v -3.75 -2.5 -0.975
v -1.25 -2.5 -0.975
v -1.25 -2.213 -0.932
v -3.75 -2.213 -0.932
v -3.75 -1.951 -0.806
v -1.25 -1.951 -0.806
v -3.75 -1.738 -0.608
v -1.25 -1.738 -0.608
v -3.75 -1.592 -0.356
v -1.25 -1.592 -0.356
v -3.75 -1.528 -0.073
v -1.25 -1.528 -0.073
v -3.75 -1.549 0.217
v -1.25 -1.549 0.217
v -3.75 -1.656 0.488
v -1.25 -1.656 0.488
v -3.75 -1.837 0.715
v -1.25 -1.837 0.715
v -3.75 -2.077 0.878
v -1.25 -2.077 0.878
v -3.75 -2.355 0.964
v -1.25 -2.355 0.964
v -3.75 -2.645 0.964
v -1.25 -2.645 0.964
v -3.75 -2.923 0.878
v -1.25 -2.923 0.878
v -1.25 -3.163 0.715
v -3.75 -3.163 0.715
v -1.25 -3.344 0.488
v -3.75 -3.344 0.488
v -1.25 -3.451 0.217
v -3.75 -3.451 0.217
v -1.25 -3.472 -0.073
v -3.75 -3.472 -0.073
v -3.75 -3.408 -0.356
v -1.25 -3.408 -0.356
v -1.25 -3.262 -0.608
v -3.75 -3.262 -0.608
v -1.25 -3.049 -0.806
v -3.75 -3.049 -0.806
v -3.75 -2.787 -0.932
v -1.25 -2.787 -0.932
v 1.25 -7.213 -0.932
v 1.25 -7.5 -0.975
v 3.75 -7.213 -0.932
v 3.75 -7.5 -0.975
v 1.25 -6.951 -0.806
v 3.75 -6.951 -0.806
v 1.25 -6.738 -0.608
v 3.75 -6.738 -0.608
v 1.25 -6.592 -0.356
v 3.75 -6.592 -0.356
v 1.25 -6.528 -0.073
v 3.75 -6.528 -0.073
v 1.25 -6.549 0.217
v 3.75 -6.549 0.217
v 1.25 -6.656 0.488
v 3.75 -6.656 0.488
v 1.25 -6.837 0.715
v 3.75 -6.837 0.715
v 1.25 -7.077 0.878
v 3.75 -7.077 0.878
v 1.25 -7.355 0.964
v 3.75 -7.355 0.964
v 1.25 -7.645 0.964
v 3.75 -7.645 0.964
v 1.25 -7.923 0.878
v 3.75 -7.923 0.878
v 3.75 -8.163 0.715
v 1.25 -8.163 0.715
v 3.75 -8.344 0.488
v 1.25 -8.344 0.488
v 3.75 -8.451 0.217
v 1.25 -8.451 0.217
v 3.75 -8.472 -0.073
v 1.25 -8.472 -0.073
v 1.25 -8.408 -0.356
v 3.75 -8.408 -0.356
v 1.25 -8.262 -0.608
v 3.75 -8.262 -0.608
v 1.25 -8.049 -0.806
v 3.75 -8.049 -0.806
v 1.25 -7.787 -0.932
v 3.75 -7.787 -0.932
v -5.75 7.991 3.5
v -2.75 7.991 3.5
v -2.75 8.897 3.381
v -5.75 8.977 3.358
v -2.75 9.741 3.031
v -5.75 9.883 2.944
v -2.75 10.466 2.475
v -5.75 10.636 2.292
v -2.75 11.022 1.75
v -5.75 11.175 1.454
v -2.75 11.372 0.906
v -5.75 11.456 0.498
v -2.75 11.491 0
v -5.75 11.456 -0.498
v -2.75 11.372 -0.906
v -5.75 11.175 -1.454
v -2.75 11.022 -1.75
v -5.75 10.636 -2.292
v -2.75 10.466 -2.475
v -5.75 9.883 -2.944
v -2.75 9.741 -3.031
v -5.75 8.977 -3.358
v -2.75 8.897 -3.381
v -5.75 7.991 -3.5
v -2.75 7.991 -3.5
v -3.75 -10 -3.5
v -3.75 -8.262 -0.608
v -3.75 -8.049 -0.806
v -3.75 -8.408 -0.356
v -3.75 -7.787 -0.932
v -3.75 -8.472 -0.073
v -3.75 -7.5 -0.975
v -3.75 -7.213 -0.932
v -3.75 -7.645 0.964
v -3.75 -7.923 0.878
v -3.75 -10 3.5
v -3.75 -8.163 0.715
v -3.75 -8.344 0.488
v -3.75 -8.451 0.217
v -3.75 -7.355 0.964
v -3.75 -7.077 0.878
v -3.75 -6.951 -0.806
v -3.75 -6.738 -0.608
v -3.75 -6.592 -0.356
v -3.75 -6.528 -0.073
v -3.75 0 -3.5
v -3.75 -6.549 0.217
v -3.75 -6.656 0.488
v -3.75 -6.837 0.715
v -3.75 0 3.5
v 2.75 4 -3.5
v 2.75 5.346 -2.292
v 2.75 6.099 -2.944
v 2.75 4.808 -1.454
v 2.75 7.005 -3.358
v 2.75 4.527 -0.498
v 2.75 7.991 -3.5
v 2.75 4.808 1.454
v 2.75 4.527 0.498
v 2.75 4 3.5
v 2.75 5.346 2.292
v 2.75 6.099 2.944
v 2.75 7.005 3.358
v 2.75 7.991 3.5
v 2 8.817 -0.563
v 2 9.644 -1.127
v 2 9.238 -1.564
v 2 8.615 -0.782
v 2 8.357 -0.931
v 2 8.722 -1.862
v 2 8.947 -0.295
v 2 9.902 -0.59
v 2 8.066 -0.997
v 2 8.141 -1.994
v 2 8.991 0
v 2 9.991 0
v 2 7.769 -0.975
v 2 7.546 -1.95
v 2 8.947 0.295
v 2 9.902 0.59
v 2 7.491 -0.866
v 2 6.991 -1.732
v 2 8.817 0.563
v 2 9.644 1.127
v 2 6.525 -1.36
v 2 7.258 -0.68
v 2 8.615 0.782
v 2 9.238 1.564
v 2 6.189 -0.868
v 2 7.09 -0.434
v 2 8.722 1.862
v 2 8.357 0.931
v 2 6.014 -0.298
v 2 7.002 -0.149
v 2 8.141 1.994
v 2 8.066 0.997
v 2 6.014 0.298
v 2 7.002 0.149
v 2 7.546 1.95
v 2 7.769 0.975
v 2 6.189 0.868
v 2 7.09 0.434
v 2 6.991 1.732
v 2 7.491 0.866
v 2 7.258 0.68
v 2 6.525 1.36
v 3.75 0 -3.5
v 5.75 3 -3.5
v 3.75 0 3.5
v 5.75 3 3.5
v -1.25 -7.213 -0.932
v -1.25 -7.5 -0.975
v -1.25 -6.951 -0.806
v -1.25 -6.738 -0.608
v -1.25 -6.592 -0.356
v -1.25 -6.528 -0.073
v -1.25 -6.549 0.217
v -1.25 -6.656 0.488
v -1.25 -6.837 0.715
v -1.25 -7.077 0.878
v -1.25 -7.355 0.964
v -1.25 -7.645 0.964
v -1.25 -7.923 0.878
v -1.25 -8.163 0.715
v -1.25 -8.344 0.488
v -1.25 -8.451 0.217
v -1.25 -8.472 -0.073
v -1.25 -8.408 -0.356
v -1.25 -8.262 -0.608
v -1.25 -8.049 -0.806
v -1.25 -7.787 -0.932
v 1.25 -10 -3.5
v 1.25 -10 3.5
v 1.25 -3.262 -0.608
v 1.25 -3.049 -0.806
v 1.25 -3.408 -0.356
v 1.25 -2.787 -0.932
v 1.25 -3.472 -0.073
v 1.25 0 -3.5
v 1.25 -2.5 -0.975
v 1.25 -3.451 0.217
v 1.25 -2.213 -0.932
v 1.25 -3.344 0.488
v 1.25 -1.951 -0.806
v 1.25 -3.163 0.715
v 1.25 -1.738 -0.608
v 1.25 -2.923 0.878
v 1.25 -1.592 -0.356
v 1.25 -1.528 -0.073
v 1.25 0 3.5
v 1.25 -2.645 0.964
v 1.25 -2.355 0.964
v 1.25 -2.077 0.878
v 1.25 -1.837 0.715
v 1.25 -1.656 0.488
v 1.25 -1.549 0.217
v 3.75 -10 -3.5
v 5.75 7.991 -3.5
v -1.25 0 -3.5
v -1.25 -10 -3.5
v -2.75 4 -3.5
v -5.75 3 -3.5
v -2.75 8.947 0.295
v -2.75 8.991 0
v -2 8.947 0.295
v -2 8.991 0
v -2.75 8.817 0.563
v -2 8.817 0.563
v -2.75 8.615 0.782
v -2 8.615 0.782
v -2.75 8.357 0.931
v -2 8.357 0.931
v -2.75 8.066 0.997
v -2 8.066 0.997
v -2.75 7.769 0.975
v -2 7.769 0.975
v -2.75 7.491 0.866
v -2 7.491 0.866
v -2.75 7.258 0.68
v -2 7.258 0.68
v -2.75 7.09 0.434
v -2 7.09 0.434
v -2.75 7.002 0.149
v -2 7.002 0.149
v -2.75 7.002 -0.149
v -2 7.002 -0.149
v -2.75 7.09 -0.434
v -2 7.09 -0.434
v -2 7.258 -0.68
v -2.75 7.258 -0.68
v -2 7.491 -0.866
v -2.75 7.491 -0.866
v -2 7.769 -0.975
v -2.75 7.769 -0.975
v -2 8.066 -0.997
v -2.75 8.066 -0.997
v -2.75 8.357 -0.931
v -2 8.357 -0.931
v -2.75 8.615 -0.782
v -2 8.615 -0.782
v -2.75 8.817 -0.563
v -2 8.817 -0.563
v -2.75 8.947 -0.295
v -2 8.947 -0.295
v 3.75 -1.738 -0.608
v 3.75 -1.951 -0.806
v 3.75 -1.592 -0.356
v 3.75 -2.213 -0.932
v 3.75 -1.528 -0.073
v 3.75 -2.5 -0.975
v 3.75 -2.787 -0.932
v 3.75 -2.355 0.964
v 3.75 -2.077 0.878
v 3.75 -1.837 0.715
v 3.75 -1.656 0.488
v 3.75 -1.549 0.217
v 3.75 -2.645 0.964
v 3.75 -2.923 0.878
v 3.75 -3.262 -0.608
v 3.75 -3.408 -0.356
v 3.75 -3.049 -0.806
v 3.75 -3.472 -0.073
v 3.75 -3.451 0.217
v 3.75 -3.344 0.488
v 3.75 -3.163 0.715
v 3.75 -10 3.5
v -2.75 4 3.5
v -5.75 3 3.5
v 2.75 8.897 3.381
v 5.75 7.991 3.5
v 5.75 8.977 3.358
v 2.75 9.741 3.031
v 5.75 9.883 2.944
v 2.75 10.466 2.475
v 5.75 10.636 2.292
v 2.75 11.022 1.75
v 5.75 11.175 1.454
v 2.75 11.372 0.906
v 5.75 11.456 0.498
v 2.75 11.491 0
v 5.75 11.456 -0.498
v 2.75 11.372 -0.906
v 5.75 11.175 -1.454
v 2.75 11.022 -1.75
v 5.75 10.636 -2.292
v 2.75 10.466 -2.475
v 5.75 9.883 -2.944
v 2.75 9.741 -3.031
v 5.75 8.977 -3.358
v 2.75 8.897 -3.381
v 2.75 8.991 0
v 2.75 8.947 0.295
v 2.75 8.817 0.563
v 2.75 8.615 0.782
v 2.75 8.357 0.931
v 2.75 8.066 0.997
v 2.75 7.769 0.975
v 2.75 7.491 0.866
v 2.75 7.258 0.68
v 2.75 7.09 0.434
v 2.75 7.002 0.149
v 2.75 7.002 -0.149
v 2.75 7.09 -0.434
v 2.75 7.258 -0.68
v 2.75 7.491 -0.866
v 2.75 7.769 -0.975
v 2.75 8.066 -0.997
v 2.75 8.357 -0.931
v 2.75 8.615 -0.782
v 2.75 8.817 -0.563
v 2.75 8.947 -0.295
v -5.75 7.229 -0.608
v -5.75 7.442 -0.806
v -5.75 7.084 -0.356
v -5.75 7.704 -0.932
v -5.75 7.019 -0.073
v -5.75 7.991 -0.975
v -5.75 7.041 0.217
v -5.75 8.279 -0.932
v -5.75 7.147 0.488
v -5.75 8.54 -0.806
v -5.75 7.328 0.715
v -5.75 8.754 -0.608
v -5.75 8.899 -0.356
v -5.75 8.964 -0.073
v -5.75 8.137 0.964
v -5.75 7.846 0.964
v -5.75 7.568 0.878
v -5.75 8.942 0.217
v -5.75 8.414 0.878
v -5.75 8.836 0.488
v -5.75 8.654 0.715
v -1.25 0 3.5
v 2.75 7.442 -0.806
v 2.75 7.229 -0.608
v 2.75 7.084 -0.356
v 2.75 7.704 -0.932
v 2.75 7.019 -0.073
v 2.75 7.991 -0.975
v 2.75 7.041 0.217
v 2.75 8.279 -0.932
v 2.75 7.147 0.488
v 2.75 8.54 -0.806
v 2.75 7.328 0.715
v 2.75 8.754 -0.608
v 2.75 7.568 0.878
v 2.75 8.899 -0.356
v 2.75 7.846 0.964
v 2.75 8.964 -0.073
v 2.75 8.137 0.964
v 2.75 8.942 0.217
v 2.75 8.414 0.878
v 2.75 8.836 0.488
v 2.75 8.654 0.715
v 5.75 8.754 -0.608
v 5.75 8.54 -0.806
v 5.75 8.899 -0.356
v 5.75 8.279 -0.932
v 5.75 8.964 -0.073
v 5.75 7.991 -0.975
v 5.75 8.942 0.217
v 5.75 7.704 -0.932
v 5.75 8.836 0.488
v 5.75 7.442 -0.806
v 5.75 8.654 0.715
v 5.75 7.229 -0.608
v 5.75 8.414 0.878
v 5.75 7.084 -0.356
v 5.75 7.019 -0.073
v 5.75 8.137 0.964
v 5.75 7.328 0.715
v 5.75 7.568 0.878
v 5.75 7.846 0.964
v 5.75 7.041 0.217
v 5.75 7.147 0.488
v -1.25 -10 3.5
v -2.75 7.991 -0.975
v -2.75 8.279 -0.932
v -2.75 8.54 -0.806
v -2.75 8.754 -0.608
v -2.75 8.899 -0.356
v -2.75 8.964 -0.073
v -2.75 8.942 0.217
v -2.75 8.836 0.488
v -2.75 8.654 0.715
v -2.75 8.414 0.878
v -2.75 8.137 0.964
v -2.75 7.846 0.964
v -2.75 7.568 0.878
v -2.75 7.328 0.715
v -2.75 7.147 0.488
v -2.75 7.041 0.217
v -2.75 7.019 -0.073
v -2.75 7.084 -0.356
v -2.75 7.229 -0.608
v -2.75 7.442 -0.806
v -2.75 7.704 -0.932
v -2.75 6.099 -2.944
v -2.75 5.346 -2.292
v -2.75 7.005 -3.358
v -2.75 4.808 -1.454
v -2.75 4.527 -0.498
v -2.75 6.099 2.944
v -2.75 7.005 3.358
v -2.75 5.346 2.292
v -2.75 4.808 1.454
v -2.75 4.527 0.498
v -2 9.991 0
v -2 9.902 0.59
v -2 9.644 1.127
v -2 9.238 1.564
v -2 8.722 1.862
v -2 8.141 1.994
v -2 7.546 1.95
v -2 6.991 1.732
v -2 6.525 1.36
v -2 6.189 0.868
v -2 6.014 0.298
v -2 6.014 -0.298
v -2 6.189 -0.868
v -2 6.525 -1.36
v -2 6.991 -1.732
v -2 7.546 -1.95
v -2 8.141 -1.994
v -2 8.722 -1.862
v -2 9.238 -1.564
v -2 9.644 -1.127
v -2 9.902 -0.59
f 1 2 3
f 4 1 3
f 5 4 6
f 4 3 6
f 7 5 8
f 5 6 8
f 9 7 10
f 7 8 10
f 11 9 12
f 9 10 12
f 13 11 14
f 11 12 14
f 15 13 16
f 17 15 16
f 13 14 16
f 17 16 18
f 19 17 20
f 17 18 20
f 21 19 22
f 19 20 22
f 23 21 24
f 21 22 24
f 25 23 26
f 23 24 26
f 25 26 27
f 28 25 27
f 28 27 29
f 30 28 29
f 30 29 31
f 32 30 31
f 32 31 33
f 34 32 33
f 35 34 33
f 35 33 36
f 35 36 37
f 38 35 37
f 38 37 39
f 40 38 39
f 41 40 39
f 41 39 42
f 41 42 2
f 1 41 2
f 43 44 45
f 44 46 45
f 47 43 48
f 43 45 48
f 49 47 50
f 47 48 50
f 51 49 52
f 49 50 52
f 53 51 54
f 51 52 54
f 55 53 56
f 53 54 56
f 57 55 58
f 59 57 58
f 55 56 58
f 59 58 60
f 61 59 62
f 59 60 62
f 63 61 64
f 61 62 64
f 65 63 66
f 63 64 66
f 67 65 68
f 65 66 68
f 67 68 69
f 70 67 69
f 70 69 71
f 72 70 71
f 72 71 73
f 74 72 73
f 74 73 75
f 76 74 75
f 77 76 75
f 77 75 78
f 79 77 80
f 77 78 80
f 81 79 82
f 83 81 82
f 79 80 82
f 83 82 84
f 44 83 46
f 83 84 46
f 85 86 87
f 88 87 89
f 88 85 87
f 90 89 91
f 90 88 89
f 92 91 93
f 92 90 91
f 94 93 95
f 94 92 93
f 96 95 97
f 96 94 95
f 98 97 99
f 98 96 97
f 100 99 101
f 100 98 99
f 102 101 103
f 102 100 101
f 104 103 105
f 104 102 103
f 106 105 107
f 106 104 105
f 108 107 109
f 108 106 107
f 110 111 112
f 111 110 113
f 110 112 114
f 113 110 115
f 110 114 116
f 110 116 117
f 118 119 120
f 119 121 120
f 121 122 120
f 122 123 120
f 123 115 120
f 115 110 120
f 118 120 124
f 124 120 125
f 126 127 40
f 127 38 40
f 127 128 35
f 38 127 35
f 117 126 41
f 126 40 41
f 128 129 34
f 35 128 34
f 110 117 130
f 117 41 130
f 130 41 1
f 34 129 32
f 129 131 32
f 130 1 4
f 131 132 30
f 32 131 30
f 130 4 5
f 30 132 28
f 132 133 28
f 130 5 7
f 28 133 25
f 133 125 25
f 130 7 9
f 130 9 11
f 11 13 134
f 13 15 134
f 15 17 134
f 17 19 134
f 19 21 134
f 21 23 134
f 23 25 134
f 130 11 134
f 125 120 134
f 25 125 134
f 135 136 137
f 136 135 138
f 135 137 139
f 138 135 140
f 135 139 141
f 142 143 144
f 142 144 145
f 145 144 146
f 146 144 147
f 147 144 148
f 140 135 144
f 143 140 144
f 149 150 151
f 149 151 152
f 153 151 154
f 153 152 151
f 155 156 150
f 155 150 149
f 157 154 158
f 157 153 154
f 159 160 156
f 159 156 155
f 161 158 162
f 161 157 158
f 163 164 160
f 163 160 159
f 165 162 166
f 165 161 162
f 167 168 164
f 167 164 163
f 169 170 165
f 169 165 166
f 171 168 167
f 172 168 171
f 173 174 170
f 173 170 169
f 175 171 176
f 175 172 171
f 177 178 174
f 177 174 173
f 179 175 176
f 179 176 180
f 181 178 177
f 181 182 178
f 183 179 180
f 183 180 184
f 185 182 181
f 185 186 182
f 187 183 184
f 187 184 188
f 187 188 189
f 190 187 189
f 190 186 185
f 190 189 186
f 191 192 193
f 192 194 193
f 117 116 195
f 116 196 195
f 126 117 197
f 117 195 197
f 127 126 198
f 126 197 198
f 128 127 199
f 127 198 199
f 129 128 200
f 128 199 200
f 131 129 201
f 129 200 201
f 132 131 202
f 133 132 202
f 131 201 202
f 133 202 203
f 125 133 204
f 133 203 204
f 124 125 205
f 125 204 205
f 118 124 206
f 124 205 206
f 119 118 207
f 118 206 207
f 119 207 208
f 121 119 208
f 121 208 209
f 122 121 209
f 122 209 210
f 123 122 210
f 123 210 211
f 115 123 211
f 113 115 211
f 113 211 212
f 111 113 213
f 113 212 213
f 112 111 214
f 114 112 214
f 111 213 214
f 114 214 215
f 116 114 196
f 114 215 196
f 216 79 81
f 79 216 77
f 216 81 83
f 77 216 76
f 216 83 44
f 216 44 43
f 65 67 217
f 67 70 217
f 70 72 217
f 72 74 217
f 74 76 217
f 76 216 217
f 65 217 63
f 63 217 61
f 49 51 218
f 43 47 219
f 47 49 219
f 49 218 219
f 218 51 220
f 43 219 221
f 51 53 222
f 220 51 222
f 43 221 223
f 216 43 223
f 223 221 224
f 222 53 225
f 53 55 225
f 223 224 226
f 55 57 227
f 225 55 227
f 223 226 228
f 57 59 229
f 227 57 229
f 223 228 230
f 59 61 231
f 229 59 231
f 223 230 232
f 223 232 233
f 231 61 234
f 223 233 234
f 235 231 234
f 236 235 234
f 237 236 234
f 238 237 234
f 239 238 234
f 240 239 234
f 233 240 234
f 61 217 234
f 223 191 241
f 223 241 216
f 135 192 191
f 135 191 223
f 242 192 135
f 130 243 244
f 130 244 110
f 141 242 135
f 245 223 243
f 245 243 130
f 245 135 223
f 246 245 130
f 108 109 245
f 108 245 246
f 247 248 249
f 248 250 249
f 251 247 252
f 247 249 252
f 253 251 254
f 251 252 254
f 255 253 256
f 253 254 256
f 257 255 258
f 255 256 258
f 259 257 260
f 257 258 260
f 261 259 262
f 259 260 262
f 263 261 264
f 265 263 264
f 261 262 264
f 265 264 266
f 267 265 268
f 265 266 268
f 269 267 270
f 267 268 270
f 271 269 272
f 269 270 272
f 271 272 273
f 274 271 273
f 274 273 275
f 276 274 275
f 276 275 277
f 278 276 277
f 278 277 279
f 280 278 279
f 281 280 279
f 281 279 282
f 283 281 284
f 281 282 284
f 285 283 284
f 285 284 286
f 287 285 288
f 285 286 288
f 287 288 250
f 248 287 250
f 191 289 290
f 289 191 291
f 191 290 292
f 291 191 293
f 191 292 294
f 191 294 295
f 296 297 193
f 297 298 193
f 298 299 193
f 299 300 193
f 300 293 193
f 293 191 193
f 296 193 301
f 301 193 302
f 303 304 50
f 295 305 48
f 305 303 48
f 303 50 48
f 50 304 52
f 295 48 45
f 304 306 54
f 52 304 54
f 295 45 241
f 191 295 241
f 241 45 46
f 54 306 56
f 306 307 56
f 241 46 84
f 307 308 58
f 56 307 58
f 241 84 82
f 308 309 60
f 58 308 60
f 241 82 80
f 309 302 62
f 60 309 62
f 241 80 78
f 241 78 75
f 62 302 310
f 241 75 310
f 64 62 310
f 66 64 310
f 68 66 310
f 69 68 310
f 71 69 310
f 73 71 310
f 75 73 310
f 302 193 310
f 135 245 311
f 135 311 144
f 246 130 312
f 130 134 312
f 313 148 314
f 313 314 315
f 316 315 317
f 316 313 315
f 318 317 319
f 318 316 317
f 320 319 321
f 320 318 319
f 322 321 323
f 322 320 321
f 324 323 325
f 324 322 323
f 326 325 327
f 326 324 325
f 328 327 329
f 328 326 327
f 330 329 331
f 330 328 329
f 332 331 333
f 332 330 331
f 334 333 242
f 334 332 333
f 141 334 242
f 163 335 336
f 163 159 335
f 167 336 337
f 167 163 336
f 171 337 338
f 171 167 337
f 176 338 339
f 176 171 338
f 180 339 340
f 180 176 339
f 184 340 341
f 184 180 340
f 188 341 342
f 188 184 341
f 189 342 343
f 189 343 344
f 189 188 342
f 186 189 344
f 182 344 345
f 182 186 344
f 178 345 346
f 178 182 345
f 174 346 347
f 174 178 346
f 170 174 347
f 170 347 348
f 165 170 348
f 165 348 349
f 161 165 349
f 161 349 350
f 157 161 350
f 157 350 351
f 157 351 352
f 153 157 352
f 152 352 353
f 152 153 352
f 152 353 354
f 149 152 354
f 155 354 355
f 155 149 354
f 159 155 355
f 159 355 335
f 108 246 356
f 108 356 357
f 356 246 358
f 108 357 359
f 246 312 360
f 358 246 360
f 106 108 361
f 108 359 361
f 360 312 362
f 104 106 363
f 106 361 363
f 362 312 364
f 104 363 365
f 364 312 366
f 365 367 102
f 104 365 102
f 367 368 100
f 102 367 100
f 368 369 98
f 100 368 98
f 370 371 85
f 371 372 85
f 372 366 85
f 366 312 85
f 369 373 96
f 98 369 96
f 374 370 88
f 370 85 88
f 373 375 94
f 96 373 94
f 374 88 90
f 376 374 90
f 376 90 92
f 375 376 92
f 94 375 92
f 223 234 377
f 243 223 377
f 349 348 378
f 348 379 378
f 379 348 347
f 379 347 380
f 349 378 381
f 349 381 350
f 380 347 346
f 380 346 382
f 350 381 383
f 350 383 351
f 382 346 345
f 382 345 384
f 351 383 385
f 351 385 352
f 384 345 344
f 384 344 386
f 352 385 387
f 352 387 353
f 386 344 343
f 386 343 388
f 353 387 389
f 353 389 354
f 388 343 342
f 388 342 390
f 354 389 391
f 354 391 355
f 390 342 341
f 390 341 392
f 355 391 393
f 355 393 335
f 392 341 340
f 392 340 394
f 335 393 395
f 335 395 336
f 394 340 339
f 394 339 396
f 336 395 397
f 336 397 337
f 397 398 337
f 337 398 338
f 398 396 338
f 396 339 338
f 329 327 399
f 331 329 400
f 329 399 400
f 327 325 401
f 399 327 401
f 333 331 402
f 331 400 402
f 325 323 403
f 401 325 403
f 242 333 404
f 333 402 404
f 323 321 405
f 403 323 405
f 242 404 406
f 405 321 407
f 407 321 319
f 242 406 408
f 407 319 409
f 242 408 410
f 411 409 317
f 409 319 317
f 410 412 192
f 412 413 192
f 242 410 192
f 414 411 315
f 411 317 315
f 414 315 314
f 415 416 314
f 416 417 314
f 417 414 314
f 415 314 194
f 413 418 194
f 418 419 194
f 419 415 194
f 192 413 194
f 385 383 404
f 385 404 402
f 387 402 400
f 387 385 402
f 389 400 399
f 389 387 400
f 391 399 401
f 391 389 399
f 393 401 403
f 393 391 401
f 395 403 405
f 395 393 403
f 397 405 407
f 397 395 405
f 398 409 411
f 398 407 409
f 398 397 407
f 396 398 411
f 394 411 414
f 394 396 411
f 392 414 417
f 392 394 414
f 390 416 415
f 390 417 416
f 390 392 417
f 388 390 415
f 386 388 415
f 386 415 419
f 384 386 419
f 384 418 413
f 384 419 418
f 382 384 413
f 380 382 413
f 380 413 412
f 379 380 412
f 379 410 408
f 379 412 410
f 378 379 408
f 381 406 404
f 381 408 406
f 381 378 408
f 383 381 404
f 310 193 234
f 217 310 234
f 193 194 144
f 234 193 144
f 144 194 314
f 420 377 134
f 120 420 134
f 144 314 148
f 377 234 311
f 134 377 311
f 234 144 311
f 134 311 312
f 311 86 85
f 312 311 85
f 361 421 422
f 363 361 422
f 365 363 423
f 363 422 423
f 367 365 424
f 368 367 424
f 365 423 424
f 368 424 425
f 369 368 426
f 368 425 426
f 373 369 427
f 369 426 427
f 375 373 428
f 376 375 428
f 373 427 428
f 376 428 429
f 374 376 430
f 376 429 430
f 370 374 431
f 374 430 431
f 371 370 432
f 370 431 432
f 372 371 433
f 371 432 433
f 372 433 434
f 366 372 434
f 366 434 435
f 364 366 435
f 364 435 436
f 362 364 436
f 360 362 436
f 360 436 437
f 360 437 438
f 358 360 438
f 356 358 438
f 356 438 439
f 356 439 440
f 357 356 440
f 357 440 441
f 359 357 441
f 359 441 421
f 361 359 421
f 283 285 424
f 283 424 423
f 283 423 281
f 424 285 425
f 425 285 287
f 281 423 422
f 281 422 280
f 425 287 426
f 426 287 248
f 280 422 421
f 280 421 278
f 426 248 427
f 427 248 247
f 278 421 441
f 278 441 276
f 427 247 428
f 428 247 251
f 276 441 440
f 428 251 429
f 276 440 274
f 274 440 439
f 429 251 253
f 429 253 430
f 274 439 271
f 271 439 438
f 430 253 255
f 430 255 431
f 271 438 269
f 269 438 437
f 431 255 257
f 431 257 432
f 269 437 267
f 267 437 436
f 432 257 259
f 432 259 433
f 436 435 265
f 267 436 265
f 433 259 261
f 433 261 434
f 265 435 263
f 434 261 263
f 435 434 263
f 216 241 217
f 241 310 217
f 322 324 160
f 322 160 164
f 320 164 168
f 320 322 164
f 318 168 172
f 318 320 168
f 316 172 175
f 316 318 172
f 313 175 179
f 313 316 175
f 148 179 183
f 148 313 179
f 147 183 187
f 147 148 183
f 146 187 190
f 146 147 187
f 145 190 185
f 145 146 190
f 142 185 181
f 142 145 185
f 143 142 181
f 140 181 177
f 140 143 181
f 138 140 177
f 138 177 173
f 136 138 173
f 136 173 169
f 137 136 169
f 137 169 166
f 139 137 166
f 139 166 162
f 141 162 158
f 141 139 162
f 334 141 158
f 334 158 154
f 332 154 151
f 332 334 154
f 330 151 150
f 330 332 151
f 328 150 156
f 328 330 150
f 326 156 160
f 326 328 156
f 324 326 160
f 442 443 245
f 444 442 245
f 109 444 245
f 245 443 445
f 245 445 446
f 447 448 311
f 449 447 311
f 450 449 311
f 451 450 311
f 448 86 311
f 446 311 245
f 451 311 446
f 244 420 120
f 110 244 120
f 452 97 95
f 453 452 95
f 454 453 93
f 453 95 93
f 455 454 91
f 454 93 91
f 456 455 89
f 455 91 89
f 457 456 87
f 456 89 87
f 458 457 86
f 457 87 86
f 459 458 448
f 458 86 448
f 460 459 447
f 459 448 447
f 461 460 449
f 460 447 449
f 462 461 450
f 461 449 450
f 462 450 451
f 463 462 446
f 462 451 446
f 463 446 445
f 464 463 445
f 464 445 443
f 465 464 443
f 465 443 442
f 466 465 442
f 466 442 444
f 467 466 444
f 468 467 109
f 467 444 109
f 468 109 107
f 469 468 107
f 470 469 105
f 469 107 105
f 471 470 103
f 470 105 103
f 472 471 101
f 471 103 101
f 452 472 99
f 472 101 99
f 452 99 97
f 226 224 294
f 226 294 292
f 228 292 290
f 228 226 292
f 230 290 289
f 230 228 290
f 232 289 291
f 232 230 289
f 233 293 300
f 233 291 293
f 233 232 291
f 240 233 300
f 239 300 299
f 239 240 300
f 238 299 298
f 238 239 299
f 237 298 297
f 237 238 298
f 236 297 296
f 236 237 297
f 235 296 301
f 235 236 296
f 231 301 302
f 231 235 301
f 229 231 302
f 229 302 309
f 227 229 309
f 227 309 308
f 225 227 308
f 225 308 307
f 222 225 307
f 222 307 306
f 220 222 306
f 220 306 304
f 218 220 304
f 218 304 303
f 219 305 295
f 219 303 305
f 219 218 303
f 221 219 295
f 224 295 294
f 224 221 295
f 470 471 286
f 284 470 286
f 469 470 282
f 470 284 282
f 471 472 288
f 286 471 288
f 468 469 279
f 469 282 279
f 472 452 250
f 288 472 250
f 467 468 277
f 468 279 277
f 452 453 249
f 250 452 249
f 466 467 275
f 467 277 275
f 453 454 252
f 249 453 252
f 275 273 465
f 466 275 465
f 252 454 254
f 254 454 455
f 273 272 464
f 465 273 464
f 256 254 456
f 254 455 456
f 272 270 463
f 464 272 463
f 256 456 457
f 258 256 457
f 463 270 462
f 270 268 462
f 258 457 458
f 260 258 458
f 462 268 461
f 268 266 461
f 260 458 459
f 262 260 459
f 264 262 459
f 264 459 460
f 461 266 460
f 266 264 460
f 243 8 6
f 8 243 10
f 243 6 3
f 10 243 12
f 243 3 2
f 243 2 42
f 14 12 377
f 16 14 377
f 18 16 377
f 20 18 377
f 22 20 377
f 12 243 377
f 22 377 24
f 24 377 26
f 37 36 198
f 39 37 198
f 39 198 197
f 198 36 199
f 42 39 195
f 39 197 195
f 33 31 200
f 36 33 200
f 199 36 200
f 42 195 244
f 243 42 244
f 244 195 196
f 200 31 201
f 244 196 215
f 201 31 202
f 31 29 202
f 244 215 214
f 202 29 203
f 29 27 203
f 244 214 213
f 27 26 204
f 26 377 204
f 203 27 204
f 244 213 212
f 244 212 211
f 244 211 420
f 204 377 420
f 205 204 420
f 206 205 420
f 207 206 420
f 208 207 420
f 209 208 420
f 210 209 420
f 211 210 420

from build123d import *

# Parameters (mm, degrees)
BOSS_EXTRUDE1_DEPTH = 3.5
SKETCH2_R           = 0.975
CUT_EXTRUDE1_DEPTH  = 7.5


with BuildPart() as part:
    # Sketch1 → Boss-Extrude1 (new body, symmetric)
    with BuildSketch(Plane.XY):
        Polygon((-1.25, -10), (-3.75, -10), (-3.75, 0), (-5.75, 3), (-5.75, 12), (-4.25, 12), (-2.75, 12), (-2.75, 4), (2.75, 4), (2.75, 12), (4.25, 12), (5.75, 12), (5.75, 3), (3.75, 0), (3.75, -10), (1.25, -10), (1.25, 0), (-1.25, 0), align=None)
    extrude(amount=BOSS_EXTRUDE1_DEPTH, both=True)

    # Sketch2 → Cut-Extrude1 (cut, symmetric)
    with BuildSketch(Plane(origin=(0, 0, 0), x_dir=(0, 0, -1), z_dir=(1, 0, 0))):
        with BuildLine():
            Line((-3.5, 12), (-3.5, 7.991246091))
            ThreePointArc((-3.5, 7.991246091), (0, 11.491246091), (3.5, 7.991246091))
            Line((3.5, 7.991246091), (3.5, 12))
            Line((3.5, 12), (-3.5, 12))
        make_face()
        with Locations((0, 7.991246091)):
            Circle(SKETCH2_R)
        with Locations((0, -2.5)):
            Circle(SKETCH2_R)
        with Locations((0, -7.5)):
            Circle(SKETCH2_R)
    extrude(amount=CUT_EXTRUDE1_DEPTH, both=True, mode=Mode.SUBTRACT)

    # Sketch3 → Revolve1 (revolve)
    with BuildSketch(Plane.XY):
        Polygon((-2.75, 8.991246091), (-2, 8.991246091), (-2, 9.991246091), (-2.75, 11.491246091), align=None)
    revolve1 = revolve(axis=Axis((-5.75, 7.991246091, 0), (1, 0, 0)))

    # Mirror1: Revolve1 across plane
    add(revolve1.mirror(Plane(origin=(0, 0, 0), x_dir=(0, 0, 1), z_dir=(1, 0, 0))))


solid = part.part
